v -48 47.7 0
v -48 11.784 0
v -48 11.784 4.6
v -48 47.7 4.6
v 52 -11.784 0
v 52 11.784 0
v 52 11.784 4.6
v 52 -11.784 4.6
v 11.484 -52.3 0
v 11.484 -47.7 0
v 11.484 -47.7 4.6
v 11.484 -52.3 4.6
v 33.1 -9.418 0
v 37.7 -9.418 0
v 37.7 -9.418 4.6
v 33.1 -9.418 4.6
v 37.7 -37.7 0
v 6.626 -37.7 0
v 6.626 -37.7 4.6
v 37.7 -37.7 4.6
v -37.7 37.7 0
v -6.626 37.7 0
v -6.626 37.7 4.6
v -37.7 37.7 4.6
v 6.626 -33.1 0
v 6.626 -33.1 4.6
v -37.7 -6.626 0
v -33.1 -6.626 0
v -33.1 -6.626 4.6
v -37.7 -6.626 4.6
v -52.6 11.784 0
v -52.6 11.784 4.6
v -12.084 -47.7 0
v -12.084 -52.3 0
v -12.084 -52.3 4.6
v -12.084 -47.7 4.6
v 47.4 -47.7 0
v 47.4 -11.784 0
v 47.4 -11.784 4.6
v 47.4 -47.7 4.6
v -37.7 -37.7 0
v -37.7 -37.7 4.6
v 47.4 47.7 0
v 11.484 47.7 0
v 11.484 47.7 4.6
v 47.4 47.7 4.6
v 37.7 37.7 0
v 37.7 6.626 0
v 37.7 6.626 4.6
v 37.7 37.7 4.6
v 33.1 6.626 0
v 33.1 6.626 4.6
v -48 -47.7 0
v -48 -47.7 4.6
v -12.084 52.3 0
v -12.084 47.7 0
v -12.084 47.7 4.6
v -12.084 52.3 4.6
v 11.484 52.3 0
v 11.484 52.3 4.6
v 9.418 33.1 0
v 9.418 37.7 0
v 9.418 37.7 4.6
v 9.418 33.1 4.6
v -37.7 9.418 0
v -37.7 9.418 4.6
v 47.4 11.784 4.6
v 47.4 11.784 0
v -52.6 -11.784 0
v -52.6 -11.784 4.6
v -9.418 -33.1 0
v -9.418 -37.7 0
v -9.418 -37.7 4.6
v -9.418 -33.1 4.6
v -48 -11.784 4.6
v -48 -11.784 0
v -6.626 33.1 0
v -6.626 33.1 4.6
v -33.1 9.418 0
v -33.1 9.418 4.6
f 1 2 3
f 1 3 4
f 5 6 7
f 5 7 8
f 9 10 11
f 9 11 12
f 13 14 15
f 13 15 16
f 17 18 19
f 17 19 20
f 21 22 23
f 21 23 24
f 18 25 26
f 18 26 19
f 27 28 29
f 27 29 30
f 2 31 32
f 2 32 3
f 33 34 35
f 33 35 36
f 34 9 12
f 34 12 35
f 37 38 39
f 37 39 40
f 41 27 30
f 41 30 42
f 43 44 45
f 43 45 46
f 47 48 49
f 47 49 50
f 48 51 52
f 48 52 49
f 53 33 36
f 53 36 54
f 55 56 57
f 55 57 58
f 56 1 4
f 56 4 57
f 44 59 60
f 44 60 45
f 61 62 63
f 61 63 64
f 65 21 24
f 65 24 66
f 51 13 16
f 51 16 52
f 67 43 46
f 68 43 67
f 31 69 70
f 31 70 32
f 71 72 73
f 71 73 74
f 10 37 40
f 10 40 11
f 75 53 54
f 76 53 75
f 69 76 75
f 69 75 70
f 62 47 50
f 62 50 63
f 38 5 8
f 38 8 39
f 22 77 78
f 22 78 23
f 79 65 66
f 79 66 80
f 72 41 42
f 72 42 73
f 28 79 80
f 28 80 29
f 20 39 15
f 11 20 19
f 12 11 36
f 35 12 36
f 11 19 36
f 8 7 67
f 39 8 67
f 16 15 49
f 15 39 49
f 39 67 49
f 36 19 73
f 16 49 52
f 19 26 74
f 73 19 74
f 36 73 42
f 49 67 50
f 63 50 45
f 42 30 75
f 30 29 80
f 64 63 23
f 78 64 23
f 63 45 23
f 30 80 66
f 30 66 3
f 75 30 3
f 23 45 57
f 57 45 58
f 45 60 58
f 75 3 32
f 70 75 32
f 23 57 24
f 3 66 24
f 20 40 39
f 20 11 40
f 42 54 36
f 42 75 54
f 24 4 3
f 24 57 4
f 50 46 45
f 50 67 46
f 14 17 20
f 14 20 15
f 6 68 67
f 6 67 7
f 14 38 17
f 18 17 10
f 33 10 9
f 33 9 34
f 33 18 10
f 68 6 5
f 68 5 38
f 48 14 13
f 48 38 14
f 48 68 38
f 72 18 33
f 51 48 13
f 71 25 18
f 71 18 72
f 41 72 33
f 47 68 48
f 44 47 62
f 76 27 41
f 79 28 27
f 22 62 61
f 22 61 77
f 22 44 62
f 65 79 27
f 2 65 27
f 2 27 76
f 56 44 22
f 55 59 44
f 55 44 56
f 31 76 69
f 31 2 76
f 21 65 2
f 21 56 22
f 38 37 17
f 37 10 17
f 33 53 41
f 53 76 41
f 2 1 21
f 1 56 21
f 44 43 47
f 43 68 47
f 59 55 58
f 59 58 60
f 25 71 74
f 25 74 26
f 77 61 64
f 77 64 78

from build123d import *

# Parameters (mm, degrees)
BOSS_EXTRUDE1_DEPTH = 4.6
CUT_EXTRUDE1_DEPTH  = 5.6


with BuildPart() as part:
    # Sketch1 → Boss-Extrude1 (new body)
    with BuildSketch(Plane.XY):
        Polygon((47.4, 11.783577493), (52, 11.783577493), (52, -11.783577493), (47.4, -11.783577493), (47.4, -47.7), (11.483577493, -47.7), (11.483577493, -52.3), (-12.083577493, -52.3), (-12.083577493, -47.7), (-48, -47.7), (-48, -11.783577493), (-52.6, -11.783577493), (-52.6, 11.783577493), (-48, 11.783577493), (-48, 47.7), (-12.083577493, 47.7), (-12.083577493, 52.3), (11.483577493, 52.3), (11.483577493, 47.7), (47.4, 47.7), align=None)
    extrude(amount=BOSS_EXTRUDE1_DEPTH)

    # Sketch2 → Cut-Extrude1 (cut, through all)
    with BuildSketch(Plane(origin=(0, 0, 0), x_dir=(-1, 0, 0), z_dir=(0, 0, -1))):
        Polygon((9.417835971, -37.7), (9.417835971, -33.1), (-6.62560911, -33.1), (-6.62560911, -37.7), (-37.7, -37.7), (-37.7, -9.417835971), (-33.1, -9.417835971), (-33.1, 6.62560911), (-37.7, 6.62560911), (-37.7, 37.7), (-9.417835971, 37.7), (-9.417835971, 33.1), (6.62560911, 33.1), (6.62560911, 37.7), (37.7, 37.7), (37.7, 9.417835971), (33.1, 9.417835971), (33.1, -6.62560911), (37.7, -6.62560911), (37.7, -37.7), align=None)
    extrude(amount=-CUT_EXTRUDE1_DEPTH, mode=Mode.SUBTRACT)


solid = part.part
